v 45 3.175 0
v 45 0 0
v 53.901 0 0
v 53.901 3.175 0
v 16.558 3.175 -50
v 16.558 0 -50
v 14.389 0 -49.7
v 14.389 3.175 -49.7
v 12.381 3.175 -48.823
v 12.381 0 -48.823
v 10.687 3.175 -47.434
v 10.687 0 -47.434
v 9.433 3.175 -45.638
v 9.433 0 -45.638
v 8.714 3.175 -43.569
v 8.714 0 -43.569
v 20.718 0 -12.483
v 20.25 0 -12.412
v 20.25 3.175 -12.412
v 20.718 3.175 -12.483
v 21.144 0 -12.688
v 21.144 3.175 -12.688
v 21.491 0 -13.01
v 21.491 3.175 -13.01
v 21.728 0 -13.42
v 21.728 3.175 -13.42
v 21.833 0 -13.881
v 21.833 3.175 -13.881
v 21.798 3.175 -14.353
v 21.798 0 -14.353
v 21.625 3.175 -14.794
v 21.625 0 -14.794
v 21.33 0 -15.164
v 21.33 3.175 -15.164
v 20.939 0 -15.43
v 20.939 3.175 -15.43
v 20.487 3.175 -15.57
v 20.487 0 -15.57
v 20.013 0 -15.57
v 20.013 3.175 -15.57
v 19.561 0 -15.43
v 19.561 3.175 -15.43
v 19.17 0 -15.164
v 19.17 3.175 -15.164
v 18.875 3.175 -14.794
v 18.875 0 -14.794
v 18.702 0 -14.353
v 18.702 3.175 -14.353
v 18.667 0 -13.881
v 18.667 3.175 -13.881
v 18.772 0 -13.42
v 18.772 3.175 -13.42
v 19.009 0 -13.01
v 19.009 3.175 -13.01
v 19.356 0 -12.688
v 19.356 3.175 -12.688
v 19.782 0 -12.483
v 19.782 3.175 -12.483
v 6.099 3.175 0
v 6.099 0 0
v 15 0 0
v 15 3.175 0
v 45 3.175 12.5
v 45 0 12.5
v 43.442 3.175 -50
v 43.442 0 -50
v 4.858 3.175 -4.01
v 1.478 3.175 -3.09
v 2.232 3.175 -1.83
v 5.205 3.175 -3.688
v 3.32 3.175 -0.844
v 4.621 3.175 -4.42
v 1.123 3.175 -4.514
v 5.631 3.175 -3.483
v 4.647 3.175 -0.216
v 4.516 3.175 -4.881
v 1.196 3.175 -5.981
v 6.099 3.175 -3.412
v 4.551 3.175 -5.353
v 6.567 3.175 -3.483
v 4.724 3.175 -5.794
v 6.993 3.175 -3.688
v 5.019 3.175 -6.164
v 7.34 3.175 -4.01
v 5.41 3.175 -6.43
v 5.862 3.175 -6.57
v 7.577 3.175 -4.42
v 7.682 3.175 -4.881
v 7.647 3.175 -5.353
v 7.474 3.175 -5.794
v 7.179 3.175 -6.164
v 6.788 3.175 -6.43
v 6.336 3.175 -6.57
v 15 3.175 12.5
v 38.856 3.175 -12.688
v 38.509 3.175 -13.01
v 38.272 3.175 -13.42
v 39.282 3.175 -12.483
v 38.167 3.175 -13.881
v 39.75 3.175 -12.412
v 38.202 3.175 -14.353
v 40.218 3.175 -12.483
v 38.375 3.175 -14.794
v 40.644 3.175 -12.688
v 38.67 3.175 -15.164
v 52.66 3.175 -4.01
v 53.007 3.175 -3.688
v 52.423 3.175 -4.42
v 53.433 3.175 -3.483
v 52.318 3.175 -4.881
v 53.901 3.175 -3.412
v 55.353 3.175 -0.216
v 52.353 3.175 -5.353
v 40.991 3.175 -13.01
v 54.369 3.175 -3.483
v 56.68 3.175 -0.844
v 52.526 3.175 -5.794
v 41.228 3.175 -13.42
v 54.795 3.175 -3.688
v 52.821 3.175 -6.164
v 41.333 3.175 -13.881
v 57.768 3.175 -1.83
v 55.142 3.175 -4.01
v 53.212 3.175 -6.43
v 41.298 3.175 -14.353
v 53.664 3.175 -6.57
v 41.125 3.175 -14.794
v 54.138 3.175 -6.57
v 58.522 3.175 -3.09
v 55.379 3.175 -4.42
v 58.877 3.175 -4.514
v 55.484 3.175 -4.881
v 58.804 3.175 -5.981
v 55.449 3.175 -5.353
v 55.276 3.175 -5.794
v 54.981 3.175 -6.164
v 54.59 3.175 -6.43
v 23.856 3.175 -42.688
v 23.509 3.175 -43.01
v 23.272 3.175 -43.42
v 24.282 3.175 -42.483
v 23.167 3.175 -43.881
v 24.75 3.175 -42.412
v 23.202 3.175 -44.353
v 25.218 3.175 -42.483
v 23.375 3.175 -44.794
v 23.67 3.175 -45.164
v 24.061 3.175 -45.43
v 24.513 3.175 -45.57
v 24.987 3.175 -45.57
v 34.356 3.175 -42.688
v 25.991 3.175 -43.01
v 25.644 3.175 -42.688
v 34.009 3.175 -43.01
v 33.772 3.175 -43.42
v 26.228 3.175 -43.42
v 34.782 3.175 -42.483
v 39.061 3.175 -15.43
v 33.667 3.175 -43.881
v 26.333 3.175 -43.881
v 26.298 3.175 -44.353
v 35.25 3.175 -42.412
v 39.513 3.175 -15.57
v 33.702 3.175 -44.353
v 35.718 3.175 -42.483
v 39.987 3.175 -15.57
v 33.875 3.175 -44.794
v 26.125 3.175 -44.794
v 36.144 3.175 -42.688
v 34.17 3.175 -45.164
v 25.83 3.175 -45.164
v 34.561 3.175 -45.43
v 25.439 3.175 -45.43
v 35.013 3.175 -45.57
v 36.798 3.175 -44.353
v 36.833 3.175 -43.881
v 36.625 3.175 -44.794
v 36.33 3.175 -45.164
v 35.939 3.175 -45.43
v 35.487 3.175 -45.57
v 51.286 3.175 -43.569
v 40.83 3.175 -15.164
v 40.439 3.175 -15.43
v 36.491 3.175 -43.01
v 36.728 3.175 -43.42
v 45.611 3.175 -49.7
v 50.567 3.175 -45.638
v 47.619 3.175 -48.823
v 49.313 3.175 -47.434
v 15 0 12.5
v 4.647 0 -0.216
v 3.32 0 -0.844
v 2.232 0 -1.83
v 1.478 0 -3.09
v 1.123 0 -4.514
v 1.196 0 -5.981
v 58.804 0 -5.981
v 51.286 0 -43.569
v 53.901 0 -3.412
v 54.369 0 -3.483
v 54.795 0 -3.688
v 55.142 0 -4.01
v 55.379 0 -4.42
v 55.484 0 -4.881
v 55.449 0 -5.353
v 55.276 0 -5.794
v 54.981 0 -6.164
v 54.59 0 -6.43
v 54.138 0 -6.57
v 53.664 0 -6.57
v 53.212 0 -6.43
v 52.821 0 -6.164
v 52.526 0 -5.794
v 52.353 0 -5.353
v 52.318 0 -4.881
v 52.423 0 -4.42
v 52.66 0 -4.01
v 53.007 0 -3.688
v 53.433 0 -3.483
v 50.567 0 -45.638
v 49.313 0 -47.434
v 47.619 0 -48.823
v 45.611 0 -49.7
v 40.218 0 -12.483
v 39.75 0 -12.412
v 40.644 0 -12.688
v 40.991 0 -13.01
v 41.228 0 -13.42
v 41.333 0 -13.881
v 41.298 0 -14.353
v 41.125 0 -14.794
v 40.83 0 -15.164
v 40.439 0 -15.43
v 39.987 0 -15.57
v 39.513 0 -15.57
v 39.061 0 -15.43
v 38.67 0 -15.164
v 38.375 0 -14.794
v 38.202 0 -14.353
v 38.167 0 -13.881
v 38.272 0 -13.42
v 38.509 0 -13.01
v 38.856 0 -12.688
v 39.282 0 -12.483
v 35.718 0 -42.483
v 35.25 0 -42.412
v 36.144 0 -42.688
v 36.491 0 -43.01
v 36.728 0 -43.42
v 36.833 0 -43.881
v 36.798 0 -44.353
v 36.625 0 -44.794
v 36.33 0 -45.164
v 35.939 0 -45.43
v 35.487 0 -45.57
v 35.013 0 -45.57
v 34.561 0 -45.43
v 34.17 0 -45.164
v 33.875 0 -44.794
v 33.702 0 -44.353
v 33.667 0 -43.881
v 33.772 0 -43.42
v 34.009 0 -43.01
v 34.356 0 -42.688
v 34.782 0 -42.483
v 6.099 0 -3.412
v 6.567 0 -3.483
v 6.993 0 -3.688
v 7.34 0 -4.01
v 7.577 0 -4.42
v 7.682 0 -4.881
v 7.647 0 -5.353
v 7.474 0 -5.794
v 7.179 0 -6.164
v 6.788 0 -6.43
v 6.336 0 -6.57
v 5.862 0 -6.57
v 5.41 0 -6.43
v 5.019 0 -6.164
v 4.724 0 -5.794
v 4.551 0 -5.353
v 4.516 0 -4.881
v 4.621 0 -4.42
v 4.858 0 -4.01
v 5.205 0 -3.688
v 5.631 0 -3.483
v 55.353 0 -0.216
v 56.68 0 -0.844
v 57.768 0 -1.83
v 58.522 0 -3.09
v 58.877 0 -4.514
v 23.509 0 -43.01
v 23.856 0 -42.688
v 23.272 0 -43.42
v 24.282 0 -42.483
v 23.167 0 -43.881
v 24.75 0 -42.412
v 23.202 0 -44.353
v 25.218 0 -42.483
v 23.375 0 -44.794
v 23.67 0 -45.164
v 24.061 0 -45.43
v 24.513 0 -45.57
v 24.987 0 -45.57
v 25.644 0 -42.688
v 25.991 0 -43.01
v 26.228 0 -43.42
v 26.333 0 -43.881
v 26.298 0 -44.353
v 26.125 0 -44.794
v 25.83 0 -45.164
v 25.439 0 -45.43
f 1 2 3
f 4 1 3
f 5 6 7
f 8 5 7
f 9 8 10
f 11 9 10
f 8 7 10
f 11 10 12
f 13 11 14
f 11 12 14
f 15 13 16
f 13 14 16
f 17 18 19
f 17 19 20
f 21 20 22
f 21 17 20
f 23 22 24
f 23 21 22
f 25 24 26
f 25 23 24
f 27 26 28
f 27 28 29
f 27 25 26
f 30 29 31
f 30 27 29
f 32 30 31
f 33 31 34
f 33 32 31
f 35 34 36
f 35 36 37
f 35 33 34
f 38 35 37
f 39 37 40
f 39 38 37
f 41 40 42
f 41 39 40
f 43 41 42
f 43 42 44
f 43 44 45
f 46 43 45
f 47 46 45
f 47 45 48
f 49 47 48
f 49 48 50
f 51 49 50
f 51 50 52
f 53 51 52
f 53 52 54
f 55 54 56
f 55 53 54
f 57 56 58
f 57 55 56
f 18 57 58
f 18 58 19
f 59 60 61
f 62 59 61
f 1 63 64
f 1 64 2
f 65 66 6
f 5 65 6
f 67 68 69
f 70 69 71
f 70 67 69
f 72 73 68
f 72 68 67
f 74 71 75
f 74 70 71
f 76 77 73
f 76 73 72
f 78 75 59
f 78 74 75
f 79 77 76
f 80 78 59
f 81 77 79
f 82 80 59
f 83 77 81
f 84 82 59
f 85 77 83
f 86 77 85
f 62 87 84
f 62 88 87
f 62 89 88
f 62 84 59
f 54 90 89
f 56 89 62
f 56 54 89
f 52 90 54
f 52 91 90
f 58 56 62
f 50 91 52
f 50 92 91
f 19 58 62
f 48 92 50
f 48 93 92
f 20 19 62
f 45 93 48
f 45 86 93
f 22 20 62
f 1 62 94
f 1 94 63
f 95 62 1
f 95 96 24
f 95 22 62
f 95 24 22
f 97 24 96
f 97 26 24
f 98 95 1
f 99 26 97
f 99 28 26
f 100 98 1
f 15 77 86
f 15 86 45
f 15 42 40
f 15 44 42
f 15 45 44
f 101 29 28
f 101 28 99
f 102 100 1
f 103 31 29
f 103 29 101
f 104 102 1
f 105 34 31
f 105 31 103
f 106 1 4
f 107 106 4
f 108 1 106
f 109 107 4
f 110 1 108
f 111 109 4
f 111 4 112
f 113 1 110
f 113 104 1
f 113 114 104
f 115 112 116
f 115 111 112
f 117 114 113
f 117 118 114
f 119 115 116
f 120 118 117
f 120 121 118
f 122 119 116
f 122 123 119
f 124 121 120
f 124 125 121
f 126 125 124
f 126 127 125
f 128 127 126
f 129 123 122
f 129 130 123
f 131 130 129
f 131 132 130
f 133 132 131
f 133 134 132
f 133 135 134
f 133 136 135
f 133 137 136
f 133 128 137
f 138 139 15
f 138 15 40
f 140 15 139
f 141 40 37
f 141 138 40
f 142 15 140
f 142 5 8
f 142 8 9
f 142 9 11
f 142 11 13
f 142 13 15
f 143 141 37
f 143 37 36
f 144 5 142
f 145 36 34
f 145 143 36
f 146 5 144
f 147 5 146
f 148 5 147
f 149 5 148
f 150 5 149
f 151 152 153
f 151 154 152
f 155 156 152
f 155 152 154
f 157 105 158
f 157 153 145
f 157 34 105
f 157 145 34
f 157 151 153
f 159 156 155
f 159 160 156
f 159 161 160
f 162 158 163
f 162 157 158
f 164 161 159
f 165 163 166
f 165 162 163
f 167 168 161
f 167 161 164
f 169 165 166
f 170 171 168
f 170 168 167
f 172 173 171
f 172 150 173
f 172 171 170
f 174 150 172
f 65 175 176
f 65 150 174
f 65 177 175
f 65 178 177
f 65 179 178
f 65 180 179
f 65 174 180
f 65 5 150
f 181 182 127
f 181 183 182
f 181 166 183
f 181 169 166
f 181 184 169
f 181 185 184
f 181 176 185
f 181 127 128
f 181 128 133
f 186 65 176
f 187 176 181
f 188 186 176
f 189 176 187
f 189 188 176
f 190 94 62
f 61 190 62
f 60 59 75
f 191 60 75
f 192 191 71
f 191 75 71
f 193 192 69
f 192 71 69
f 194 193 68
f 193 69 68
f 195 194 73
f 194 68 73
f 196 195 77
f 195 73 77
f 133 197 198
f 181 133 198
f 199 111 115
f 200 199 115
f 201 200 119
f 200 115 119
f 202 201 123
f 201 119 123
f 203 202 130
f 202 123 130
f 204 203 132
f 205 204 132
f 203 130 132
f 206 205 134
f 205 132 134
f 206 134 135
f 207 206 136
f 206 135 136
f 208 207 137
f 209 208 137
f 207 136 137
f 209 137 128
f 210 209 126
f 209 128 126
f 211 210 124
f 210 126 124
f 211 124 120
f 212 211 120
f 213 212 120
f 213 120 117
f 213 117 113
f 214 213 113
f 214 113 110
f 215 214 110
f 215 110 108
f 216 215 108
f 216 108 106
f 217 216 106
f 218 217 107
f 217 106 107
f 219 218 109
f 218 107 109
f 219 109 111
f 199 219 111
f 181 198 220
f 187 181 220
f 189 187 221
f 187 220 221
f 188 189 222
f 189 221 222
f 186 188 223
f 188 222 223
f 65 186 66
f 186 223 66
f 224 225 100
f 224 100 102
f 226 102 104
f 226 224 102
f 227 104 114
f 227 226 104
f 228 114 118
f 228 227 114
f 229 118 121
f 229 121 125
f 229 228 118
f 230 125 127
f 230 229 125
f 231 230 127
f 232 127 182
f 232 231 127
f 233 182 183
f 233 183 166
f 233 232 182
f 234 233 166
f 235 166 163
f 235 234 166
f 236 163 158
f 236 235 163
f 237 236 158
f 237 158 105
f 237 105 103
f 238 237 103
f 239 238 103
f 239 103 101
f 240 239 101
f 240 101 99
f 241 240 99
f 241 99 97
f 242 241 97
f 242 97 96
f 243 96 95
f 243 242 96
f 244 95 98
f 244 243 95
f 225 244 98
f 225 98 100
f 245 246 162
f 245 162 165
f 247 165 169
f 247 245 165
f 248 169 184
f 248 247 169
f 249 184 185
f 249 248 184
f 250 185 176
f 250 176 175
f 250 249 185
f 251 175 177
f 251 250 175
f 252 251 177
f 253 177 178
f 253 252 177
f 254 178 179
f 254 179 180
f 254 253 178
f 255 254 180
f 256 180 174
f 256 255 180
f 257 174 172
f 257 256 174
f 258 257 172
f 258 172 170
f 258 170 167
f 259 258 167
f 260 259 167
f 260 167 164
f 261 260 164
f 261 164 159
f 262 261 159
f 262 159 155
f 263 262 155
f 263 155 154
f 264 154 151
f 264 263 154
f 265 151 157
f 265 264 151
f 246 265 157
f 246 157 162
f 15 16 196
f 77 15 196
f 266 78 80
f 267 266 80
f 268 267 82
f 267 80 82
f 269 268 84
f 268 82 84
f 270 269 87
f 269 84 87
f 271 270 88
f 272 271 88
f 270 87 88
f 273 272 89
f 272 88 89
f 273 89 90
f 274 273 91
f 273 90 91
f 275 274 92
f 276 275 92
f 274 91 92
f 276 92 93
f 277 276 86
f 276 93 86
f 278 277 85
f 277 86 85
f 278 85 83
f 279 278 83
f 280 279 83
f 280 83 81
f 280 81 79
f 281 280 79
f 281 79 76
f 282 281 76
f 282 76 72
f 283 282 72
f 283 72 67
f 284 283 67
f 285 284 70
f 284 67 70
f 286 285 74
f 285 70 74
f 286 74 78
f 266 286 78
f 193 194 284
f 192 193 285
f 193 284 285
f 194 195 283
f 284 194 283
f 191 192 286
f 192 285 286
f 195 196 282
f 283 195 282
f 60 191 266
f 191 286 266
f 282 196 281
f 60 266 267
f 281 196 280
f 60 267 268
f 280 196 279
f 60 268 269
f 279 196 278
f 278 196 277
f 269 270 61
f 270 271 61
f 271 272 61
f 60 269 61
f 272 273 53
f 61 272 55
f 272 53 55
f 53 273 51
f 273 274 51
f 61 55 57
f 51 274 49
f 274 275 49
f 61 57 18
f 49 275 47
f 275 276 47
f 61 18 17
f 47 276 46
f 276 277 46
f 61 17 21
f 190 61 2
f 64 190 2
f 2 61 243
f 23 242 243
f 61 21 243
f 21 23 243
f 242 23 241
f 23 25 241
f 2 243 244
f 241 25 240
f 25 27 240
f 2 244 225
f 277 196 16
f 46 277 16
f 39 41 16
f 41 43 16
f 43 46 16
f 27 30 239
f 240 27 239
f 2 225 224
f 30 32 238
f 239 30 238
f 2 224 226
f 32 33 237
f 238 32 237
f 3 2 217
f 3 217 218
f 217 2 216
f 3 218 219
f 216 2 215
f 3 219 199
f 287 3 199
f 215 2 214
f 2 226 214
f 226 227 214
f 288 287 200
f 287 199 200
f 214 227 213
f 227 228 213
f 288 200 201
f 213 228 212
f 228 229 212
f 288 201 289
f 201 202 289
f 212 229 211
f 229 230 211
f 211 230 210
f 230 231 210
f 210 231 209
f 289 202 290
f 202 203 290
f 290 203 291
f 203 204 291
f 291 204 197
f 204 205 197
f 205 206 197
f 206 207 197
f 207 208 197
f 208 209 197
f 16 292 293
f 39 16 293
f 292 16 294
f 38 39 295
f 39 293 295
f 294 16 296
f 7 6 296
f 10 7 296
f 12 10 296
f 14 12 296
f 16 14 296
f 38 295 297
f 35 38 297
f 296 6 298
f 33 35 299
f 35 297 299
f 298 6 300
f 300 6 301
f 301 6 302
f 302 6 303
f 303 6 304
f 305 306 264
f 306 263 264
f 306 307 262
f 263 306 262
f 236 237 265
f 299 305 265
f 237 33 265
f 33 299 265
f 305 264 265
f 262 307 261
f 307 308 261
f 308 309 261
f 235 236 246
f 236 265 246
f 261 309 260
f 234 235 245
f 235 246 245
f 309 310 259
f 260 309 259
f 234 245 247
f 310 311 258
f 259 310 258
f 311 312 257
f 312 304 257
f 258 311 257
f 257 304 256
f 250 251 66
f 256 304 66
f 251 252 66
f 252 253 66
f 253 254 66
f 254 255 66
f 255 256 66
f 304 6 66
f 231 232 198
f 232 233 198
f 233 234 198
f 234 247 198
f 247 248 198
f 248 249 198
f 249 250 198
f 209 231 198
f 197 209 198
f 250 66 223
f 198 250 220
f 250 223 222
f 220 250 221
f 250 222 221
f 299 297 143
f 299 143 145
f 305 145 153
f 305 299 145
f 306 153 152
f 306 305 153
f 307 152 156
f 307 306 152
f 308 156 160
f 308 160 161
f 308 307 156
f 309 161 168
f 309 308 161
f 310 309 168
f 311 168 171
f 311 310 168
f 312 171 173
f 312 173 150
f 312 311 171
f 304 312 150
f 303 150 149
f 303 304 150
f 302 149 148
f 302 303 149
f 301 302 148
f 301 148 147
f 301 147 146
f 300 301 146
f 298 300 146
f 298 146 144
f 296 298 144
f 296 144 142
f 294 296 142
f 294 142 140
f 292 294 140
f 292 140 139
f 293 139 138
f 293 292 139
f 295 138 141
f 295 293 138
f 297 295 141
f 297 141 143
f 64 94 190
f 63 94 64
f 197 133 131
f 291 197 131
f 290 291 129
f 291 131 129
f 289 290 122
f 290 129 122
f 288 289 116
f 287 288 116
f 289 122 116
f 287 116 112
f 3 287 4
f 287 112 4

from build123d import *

# Parameters (mm, degrees)
CROQUIS1_R              = 1.5875
SALIENTE_EXTRUIR1_DEPTH = 3.175
CROQUIS2_R              = 1.5875
CORTAR_EXTRUIR1_DEPTH   = 3.175
CROQUIS3_W              = 30
CROQUIS3_H              = 12.5
SALIENTE_EXTRUIR2_DEPTH = 3.175


with BuildPart() as part:
    # Croquis1 → Saliente-Extruir1 (new body)
    with BuildSketch(Plane(origin=(0, 0, 0), x_dir=(1, 0, 0), z_dir=(0, 1, 0))):
        with BuildLine():
            Line((8.713785816, 43.568929081), (0, 0))
            Line((0, 0), (60, 0))
            Line((60, 0), (51.286214184, 43.568929081))
            ThreePointArc((51.286214184, 43.568929081), (48.513480023, 48.186737131), (43.441568778, 50))
            Line((43.441568778, 50), (16.558431222, 50))
            ThreePointArc((16.558431222, 50), (11.486519977, 48.186737131), (8.713785816, 43.568929081))
        make_face()
        with Locations(Location((39.75, 14, 0), (0, 0, 270))):
            Circle(CROQUIS1_R, mode=Mode.SUBTRACT)
        with Locations(Location((20.25, 14, 0), (0, 0, 270))):
            Circle(CROQUIS1_R, mode=Mode.SUBTRACT)
        with Locations(Location((24.75, 44, 0), (0, 0, 270))):
            Circle(CROQUIS1_R, mode=Mode.SUBTRACT)
        with Locations(Location((35.25, 44, 0), (0, 0, 270))):
            Circle(CROQUIS1_R, mode=Mode.SUBTRACT)
    extrude(amount=SALIENTE_EXTRUIR1_DEPTH)

    # Croquis2 → Cortar-Extruir1 (cut)
    with BuildSketch(Plane(origin=(0, 3.175, 0), x_dir=(1, 0, 0), z_dir=(0, 1, 0))):
        with Locations(Location((6.099019514, 5, 0), (0, 0, 270))):
            Circle(CROQUIS2_R)
        with Locations(Location((53.900980486, 5, 0), (0, 0, 270))):
            Circle(CROQUIS2_R)
        with BuildLine():
            Line((53.900980486, 0), (60, 0))
            Line((60, 0), (58.803883865, 5.980580676))
            ThreePointArc((58.803883865, 5.980580676), (57.767691193, 1.830055472), (53.900980486, 0))
        make_face()
        with BuildLine():
            Line((1.196116135, 5.980580676), (0, 0))
            Line((0, 0), (6.099019514, 0))
            ThreePointArc((6.099019514, 0), (2.232308807, 1.830055472), (1.196116135, 5.980580676))
        make_face()
    extrude(amount=-CORTAR_EXTRUIR1_DEPTH, mode=Mode.SUBTRACT)

    # Croquis3 → Saliente-Extruir2 (add)
    with BuildSketch(Plane(origin=(0, 3.175, 0), x_dir=(1, 0, 0), z_dir=(0, 1, 0))):
        with Locations((30, -6.25)):
            Rectangle(CROQUIS3_W, CROQUIS3_H)
    extrude(amount=-SALIENTE_EXTRUIR2_DEPTH)


solid = part.part
